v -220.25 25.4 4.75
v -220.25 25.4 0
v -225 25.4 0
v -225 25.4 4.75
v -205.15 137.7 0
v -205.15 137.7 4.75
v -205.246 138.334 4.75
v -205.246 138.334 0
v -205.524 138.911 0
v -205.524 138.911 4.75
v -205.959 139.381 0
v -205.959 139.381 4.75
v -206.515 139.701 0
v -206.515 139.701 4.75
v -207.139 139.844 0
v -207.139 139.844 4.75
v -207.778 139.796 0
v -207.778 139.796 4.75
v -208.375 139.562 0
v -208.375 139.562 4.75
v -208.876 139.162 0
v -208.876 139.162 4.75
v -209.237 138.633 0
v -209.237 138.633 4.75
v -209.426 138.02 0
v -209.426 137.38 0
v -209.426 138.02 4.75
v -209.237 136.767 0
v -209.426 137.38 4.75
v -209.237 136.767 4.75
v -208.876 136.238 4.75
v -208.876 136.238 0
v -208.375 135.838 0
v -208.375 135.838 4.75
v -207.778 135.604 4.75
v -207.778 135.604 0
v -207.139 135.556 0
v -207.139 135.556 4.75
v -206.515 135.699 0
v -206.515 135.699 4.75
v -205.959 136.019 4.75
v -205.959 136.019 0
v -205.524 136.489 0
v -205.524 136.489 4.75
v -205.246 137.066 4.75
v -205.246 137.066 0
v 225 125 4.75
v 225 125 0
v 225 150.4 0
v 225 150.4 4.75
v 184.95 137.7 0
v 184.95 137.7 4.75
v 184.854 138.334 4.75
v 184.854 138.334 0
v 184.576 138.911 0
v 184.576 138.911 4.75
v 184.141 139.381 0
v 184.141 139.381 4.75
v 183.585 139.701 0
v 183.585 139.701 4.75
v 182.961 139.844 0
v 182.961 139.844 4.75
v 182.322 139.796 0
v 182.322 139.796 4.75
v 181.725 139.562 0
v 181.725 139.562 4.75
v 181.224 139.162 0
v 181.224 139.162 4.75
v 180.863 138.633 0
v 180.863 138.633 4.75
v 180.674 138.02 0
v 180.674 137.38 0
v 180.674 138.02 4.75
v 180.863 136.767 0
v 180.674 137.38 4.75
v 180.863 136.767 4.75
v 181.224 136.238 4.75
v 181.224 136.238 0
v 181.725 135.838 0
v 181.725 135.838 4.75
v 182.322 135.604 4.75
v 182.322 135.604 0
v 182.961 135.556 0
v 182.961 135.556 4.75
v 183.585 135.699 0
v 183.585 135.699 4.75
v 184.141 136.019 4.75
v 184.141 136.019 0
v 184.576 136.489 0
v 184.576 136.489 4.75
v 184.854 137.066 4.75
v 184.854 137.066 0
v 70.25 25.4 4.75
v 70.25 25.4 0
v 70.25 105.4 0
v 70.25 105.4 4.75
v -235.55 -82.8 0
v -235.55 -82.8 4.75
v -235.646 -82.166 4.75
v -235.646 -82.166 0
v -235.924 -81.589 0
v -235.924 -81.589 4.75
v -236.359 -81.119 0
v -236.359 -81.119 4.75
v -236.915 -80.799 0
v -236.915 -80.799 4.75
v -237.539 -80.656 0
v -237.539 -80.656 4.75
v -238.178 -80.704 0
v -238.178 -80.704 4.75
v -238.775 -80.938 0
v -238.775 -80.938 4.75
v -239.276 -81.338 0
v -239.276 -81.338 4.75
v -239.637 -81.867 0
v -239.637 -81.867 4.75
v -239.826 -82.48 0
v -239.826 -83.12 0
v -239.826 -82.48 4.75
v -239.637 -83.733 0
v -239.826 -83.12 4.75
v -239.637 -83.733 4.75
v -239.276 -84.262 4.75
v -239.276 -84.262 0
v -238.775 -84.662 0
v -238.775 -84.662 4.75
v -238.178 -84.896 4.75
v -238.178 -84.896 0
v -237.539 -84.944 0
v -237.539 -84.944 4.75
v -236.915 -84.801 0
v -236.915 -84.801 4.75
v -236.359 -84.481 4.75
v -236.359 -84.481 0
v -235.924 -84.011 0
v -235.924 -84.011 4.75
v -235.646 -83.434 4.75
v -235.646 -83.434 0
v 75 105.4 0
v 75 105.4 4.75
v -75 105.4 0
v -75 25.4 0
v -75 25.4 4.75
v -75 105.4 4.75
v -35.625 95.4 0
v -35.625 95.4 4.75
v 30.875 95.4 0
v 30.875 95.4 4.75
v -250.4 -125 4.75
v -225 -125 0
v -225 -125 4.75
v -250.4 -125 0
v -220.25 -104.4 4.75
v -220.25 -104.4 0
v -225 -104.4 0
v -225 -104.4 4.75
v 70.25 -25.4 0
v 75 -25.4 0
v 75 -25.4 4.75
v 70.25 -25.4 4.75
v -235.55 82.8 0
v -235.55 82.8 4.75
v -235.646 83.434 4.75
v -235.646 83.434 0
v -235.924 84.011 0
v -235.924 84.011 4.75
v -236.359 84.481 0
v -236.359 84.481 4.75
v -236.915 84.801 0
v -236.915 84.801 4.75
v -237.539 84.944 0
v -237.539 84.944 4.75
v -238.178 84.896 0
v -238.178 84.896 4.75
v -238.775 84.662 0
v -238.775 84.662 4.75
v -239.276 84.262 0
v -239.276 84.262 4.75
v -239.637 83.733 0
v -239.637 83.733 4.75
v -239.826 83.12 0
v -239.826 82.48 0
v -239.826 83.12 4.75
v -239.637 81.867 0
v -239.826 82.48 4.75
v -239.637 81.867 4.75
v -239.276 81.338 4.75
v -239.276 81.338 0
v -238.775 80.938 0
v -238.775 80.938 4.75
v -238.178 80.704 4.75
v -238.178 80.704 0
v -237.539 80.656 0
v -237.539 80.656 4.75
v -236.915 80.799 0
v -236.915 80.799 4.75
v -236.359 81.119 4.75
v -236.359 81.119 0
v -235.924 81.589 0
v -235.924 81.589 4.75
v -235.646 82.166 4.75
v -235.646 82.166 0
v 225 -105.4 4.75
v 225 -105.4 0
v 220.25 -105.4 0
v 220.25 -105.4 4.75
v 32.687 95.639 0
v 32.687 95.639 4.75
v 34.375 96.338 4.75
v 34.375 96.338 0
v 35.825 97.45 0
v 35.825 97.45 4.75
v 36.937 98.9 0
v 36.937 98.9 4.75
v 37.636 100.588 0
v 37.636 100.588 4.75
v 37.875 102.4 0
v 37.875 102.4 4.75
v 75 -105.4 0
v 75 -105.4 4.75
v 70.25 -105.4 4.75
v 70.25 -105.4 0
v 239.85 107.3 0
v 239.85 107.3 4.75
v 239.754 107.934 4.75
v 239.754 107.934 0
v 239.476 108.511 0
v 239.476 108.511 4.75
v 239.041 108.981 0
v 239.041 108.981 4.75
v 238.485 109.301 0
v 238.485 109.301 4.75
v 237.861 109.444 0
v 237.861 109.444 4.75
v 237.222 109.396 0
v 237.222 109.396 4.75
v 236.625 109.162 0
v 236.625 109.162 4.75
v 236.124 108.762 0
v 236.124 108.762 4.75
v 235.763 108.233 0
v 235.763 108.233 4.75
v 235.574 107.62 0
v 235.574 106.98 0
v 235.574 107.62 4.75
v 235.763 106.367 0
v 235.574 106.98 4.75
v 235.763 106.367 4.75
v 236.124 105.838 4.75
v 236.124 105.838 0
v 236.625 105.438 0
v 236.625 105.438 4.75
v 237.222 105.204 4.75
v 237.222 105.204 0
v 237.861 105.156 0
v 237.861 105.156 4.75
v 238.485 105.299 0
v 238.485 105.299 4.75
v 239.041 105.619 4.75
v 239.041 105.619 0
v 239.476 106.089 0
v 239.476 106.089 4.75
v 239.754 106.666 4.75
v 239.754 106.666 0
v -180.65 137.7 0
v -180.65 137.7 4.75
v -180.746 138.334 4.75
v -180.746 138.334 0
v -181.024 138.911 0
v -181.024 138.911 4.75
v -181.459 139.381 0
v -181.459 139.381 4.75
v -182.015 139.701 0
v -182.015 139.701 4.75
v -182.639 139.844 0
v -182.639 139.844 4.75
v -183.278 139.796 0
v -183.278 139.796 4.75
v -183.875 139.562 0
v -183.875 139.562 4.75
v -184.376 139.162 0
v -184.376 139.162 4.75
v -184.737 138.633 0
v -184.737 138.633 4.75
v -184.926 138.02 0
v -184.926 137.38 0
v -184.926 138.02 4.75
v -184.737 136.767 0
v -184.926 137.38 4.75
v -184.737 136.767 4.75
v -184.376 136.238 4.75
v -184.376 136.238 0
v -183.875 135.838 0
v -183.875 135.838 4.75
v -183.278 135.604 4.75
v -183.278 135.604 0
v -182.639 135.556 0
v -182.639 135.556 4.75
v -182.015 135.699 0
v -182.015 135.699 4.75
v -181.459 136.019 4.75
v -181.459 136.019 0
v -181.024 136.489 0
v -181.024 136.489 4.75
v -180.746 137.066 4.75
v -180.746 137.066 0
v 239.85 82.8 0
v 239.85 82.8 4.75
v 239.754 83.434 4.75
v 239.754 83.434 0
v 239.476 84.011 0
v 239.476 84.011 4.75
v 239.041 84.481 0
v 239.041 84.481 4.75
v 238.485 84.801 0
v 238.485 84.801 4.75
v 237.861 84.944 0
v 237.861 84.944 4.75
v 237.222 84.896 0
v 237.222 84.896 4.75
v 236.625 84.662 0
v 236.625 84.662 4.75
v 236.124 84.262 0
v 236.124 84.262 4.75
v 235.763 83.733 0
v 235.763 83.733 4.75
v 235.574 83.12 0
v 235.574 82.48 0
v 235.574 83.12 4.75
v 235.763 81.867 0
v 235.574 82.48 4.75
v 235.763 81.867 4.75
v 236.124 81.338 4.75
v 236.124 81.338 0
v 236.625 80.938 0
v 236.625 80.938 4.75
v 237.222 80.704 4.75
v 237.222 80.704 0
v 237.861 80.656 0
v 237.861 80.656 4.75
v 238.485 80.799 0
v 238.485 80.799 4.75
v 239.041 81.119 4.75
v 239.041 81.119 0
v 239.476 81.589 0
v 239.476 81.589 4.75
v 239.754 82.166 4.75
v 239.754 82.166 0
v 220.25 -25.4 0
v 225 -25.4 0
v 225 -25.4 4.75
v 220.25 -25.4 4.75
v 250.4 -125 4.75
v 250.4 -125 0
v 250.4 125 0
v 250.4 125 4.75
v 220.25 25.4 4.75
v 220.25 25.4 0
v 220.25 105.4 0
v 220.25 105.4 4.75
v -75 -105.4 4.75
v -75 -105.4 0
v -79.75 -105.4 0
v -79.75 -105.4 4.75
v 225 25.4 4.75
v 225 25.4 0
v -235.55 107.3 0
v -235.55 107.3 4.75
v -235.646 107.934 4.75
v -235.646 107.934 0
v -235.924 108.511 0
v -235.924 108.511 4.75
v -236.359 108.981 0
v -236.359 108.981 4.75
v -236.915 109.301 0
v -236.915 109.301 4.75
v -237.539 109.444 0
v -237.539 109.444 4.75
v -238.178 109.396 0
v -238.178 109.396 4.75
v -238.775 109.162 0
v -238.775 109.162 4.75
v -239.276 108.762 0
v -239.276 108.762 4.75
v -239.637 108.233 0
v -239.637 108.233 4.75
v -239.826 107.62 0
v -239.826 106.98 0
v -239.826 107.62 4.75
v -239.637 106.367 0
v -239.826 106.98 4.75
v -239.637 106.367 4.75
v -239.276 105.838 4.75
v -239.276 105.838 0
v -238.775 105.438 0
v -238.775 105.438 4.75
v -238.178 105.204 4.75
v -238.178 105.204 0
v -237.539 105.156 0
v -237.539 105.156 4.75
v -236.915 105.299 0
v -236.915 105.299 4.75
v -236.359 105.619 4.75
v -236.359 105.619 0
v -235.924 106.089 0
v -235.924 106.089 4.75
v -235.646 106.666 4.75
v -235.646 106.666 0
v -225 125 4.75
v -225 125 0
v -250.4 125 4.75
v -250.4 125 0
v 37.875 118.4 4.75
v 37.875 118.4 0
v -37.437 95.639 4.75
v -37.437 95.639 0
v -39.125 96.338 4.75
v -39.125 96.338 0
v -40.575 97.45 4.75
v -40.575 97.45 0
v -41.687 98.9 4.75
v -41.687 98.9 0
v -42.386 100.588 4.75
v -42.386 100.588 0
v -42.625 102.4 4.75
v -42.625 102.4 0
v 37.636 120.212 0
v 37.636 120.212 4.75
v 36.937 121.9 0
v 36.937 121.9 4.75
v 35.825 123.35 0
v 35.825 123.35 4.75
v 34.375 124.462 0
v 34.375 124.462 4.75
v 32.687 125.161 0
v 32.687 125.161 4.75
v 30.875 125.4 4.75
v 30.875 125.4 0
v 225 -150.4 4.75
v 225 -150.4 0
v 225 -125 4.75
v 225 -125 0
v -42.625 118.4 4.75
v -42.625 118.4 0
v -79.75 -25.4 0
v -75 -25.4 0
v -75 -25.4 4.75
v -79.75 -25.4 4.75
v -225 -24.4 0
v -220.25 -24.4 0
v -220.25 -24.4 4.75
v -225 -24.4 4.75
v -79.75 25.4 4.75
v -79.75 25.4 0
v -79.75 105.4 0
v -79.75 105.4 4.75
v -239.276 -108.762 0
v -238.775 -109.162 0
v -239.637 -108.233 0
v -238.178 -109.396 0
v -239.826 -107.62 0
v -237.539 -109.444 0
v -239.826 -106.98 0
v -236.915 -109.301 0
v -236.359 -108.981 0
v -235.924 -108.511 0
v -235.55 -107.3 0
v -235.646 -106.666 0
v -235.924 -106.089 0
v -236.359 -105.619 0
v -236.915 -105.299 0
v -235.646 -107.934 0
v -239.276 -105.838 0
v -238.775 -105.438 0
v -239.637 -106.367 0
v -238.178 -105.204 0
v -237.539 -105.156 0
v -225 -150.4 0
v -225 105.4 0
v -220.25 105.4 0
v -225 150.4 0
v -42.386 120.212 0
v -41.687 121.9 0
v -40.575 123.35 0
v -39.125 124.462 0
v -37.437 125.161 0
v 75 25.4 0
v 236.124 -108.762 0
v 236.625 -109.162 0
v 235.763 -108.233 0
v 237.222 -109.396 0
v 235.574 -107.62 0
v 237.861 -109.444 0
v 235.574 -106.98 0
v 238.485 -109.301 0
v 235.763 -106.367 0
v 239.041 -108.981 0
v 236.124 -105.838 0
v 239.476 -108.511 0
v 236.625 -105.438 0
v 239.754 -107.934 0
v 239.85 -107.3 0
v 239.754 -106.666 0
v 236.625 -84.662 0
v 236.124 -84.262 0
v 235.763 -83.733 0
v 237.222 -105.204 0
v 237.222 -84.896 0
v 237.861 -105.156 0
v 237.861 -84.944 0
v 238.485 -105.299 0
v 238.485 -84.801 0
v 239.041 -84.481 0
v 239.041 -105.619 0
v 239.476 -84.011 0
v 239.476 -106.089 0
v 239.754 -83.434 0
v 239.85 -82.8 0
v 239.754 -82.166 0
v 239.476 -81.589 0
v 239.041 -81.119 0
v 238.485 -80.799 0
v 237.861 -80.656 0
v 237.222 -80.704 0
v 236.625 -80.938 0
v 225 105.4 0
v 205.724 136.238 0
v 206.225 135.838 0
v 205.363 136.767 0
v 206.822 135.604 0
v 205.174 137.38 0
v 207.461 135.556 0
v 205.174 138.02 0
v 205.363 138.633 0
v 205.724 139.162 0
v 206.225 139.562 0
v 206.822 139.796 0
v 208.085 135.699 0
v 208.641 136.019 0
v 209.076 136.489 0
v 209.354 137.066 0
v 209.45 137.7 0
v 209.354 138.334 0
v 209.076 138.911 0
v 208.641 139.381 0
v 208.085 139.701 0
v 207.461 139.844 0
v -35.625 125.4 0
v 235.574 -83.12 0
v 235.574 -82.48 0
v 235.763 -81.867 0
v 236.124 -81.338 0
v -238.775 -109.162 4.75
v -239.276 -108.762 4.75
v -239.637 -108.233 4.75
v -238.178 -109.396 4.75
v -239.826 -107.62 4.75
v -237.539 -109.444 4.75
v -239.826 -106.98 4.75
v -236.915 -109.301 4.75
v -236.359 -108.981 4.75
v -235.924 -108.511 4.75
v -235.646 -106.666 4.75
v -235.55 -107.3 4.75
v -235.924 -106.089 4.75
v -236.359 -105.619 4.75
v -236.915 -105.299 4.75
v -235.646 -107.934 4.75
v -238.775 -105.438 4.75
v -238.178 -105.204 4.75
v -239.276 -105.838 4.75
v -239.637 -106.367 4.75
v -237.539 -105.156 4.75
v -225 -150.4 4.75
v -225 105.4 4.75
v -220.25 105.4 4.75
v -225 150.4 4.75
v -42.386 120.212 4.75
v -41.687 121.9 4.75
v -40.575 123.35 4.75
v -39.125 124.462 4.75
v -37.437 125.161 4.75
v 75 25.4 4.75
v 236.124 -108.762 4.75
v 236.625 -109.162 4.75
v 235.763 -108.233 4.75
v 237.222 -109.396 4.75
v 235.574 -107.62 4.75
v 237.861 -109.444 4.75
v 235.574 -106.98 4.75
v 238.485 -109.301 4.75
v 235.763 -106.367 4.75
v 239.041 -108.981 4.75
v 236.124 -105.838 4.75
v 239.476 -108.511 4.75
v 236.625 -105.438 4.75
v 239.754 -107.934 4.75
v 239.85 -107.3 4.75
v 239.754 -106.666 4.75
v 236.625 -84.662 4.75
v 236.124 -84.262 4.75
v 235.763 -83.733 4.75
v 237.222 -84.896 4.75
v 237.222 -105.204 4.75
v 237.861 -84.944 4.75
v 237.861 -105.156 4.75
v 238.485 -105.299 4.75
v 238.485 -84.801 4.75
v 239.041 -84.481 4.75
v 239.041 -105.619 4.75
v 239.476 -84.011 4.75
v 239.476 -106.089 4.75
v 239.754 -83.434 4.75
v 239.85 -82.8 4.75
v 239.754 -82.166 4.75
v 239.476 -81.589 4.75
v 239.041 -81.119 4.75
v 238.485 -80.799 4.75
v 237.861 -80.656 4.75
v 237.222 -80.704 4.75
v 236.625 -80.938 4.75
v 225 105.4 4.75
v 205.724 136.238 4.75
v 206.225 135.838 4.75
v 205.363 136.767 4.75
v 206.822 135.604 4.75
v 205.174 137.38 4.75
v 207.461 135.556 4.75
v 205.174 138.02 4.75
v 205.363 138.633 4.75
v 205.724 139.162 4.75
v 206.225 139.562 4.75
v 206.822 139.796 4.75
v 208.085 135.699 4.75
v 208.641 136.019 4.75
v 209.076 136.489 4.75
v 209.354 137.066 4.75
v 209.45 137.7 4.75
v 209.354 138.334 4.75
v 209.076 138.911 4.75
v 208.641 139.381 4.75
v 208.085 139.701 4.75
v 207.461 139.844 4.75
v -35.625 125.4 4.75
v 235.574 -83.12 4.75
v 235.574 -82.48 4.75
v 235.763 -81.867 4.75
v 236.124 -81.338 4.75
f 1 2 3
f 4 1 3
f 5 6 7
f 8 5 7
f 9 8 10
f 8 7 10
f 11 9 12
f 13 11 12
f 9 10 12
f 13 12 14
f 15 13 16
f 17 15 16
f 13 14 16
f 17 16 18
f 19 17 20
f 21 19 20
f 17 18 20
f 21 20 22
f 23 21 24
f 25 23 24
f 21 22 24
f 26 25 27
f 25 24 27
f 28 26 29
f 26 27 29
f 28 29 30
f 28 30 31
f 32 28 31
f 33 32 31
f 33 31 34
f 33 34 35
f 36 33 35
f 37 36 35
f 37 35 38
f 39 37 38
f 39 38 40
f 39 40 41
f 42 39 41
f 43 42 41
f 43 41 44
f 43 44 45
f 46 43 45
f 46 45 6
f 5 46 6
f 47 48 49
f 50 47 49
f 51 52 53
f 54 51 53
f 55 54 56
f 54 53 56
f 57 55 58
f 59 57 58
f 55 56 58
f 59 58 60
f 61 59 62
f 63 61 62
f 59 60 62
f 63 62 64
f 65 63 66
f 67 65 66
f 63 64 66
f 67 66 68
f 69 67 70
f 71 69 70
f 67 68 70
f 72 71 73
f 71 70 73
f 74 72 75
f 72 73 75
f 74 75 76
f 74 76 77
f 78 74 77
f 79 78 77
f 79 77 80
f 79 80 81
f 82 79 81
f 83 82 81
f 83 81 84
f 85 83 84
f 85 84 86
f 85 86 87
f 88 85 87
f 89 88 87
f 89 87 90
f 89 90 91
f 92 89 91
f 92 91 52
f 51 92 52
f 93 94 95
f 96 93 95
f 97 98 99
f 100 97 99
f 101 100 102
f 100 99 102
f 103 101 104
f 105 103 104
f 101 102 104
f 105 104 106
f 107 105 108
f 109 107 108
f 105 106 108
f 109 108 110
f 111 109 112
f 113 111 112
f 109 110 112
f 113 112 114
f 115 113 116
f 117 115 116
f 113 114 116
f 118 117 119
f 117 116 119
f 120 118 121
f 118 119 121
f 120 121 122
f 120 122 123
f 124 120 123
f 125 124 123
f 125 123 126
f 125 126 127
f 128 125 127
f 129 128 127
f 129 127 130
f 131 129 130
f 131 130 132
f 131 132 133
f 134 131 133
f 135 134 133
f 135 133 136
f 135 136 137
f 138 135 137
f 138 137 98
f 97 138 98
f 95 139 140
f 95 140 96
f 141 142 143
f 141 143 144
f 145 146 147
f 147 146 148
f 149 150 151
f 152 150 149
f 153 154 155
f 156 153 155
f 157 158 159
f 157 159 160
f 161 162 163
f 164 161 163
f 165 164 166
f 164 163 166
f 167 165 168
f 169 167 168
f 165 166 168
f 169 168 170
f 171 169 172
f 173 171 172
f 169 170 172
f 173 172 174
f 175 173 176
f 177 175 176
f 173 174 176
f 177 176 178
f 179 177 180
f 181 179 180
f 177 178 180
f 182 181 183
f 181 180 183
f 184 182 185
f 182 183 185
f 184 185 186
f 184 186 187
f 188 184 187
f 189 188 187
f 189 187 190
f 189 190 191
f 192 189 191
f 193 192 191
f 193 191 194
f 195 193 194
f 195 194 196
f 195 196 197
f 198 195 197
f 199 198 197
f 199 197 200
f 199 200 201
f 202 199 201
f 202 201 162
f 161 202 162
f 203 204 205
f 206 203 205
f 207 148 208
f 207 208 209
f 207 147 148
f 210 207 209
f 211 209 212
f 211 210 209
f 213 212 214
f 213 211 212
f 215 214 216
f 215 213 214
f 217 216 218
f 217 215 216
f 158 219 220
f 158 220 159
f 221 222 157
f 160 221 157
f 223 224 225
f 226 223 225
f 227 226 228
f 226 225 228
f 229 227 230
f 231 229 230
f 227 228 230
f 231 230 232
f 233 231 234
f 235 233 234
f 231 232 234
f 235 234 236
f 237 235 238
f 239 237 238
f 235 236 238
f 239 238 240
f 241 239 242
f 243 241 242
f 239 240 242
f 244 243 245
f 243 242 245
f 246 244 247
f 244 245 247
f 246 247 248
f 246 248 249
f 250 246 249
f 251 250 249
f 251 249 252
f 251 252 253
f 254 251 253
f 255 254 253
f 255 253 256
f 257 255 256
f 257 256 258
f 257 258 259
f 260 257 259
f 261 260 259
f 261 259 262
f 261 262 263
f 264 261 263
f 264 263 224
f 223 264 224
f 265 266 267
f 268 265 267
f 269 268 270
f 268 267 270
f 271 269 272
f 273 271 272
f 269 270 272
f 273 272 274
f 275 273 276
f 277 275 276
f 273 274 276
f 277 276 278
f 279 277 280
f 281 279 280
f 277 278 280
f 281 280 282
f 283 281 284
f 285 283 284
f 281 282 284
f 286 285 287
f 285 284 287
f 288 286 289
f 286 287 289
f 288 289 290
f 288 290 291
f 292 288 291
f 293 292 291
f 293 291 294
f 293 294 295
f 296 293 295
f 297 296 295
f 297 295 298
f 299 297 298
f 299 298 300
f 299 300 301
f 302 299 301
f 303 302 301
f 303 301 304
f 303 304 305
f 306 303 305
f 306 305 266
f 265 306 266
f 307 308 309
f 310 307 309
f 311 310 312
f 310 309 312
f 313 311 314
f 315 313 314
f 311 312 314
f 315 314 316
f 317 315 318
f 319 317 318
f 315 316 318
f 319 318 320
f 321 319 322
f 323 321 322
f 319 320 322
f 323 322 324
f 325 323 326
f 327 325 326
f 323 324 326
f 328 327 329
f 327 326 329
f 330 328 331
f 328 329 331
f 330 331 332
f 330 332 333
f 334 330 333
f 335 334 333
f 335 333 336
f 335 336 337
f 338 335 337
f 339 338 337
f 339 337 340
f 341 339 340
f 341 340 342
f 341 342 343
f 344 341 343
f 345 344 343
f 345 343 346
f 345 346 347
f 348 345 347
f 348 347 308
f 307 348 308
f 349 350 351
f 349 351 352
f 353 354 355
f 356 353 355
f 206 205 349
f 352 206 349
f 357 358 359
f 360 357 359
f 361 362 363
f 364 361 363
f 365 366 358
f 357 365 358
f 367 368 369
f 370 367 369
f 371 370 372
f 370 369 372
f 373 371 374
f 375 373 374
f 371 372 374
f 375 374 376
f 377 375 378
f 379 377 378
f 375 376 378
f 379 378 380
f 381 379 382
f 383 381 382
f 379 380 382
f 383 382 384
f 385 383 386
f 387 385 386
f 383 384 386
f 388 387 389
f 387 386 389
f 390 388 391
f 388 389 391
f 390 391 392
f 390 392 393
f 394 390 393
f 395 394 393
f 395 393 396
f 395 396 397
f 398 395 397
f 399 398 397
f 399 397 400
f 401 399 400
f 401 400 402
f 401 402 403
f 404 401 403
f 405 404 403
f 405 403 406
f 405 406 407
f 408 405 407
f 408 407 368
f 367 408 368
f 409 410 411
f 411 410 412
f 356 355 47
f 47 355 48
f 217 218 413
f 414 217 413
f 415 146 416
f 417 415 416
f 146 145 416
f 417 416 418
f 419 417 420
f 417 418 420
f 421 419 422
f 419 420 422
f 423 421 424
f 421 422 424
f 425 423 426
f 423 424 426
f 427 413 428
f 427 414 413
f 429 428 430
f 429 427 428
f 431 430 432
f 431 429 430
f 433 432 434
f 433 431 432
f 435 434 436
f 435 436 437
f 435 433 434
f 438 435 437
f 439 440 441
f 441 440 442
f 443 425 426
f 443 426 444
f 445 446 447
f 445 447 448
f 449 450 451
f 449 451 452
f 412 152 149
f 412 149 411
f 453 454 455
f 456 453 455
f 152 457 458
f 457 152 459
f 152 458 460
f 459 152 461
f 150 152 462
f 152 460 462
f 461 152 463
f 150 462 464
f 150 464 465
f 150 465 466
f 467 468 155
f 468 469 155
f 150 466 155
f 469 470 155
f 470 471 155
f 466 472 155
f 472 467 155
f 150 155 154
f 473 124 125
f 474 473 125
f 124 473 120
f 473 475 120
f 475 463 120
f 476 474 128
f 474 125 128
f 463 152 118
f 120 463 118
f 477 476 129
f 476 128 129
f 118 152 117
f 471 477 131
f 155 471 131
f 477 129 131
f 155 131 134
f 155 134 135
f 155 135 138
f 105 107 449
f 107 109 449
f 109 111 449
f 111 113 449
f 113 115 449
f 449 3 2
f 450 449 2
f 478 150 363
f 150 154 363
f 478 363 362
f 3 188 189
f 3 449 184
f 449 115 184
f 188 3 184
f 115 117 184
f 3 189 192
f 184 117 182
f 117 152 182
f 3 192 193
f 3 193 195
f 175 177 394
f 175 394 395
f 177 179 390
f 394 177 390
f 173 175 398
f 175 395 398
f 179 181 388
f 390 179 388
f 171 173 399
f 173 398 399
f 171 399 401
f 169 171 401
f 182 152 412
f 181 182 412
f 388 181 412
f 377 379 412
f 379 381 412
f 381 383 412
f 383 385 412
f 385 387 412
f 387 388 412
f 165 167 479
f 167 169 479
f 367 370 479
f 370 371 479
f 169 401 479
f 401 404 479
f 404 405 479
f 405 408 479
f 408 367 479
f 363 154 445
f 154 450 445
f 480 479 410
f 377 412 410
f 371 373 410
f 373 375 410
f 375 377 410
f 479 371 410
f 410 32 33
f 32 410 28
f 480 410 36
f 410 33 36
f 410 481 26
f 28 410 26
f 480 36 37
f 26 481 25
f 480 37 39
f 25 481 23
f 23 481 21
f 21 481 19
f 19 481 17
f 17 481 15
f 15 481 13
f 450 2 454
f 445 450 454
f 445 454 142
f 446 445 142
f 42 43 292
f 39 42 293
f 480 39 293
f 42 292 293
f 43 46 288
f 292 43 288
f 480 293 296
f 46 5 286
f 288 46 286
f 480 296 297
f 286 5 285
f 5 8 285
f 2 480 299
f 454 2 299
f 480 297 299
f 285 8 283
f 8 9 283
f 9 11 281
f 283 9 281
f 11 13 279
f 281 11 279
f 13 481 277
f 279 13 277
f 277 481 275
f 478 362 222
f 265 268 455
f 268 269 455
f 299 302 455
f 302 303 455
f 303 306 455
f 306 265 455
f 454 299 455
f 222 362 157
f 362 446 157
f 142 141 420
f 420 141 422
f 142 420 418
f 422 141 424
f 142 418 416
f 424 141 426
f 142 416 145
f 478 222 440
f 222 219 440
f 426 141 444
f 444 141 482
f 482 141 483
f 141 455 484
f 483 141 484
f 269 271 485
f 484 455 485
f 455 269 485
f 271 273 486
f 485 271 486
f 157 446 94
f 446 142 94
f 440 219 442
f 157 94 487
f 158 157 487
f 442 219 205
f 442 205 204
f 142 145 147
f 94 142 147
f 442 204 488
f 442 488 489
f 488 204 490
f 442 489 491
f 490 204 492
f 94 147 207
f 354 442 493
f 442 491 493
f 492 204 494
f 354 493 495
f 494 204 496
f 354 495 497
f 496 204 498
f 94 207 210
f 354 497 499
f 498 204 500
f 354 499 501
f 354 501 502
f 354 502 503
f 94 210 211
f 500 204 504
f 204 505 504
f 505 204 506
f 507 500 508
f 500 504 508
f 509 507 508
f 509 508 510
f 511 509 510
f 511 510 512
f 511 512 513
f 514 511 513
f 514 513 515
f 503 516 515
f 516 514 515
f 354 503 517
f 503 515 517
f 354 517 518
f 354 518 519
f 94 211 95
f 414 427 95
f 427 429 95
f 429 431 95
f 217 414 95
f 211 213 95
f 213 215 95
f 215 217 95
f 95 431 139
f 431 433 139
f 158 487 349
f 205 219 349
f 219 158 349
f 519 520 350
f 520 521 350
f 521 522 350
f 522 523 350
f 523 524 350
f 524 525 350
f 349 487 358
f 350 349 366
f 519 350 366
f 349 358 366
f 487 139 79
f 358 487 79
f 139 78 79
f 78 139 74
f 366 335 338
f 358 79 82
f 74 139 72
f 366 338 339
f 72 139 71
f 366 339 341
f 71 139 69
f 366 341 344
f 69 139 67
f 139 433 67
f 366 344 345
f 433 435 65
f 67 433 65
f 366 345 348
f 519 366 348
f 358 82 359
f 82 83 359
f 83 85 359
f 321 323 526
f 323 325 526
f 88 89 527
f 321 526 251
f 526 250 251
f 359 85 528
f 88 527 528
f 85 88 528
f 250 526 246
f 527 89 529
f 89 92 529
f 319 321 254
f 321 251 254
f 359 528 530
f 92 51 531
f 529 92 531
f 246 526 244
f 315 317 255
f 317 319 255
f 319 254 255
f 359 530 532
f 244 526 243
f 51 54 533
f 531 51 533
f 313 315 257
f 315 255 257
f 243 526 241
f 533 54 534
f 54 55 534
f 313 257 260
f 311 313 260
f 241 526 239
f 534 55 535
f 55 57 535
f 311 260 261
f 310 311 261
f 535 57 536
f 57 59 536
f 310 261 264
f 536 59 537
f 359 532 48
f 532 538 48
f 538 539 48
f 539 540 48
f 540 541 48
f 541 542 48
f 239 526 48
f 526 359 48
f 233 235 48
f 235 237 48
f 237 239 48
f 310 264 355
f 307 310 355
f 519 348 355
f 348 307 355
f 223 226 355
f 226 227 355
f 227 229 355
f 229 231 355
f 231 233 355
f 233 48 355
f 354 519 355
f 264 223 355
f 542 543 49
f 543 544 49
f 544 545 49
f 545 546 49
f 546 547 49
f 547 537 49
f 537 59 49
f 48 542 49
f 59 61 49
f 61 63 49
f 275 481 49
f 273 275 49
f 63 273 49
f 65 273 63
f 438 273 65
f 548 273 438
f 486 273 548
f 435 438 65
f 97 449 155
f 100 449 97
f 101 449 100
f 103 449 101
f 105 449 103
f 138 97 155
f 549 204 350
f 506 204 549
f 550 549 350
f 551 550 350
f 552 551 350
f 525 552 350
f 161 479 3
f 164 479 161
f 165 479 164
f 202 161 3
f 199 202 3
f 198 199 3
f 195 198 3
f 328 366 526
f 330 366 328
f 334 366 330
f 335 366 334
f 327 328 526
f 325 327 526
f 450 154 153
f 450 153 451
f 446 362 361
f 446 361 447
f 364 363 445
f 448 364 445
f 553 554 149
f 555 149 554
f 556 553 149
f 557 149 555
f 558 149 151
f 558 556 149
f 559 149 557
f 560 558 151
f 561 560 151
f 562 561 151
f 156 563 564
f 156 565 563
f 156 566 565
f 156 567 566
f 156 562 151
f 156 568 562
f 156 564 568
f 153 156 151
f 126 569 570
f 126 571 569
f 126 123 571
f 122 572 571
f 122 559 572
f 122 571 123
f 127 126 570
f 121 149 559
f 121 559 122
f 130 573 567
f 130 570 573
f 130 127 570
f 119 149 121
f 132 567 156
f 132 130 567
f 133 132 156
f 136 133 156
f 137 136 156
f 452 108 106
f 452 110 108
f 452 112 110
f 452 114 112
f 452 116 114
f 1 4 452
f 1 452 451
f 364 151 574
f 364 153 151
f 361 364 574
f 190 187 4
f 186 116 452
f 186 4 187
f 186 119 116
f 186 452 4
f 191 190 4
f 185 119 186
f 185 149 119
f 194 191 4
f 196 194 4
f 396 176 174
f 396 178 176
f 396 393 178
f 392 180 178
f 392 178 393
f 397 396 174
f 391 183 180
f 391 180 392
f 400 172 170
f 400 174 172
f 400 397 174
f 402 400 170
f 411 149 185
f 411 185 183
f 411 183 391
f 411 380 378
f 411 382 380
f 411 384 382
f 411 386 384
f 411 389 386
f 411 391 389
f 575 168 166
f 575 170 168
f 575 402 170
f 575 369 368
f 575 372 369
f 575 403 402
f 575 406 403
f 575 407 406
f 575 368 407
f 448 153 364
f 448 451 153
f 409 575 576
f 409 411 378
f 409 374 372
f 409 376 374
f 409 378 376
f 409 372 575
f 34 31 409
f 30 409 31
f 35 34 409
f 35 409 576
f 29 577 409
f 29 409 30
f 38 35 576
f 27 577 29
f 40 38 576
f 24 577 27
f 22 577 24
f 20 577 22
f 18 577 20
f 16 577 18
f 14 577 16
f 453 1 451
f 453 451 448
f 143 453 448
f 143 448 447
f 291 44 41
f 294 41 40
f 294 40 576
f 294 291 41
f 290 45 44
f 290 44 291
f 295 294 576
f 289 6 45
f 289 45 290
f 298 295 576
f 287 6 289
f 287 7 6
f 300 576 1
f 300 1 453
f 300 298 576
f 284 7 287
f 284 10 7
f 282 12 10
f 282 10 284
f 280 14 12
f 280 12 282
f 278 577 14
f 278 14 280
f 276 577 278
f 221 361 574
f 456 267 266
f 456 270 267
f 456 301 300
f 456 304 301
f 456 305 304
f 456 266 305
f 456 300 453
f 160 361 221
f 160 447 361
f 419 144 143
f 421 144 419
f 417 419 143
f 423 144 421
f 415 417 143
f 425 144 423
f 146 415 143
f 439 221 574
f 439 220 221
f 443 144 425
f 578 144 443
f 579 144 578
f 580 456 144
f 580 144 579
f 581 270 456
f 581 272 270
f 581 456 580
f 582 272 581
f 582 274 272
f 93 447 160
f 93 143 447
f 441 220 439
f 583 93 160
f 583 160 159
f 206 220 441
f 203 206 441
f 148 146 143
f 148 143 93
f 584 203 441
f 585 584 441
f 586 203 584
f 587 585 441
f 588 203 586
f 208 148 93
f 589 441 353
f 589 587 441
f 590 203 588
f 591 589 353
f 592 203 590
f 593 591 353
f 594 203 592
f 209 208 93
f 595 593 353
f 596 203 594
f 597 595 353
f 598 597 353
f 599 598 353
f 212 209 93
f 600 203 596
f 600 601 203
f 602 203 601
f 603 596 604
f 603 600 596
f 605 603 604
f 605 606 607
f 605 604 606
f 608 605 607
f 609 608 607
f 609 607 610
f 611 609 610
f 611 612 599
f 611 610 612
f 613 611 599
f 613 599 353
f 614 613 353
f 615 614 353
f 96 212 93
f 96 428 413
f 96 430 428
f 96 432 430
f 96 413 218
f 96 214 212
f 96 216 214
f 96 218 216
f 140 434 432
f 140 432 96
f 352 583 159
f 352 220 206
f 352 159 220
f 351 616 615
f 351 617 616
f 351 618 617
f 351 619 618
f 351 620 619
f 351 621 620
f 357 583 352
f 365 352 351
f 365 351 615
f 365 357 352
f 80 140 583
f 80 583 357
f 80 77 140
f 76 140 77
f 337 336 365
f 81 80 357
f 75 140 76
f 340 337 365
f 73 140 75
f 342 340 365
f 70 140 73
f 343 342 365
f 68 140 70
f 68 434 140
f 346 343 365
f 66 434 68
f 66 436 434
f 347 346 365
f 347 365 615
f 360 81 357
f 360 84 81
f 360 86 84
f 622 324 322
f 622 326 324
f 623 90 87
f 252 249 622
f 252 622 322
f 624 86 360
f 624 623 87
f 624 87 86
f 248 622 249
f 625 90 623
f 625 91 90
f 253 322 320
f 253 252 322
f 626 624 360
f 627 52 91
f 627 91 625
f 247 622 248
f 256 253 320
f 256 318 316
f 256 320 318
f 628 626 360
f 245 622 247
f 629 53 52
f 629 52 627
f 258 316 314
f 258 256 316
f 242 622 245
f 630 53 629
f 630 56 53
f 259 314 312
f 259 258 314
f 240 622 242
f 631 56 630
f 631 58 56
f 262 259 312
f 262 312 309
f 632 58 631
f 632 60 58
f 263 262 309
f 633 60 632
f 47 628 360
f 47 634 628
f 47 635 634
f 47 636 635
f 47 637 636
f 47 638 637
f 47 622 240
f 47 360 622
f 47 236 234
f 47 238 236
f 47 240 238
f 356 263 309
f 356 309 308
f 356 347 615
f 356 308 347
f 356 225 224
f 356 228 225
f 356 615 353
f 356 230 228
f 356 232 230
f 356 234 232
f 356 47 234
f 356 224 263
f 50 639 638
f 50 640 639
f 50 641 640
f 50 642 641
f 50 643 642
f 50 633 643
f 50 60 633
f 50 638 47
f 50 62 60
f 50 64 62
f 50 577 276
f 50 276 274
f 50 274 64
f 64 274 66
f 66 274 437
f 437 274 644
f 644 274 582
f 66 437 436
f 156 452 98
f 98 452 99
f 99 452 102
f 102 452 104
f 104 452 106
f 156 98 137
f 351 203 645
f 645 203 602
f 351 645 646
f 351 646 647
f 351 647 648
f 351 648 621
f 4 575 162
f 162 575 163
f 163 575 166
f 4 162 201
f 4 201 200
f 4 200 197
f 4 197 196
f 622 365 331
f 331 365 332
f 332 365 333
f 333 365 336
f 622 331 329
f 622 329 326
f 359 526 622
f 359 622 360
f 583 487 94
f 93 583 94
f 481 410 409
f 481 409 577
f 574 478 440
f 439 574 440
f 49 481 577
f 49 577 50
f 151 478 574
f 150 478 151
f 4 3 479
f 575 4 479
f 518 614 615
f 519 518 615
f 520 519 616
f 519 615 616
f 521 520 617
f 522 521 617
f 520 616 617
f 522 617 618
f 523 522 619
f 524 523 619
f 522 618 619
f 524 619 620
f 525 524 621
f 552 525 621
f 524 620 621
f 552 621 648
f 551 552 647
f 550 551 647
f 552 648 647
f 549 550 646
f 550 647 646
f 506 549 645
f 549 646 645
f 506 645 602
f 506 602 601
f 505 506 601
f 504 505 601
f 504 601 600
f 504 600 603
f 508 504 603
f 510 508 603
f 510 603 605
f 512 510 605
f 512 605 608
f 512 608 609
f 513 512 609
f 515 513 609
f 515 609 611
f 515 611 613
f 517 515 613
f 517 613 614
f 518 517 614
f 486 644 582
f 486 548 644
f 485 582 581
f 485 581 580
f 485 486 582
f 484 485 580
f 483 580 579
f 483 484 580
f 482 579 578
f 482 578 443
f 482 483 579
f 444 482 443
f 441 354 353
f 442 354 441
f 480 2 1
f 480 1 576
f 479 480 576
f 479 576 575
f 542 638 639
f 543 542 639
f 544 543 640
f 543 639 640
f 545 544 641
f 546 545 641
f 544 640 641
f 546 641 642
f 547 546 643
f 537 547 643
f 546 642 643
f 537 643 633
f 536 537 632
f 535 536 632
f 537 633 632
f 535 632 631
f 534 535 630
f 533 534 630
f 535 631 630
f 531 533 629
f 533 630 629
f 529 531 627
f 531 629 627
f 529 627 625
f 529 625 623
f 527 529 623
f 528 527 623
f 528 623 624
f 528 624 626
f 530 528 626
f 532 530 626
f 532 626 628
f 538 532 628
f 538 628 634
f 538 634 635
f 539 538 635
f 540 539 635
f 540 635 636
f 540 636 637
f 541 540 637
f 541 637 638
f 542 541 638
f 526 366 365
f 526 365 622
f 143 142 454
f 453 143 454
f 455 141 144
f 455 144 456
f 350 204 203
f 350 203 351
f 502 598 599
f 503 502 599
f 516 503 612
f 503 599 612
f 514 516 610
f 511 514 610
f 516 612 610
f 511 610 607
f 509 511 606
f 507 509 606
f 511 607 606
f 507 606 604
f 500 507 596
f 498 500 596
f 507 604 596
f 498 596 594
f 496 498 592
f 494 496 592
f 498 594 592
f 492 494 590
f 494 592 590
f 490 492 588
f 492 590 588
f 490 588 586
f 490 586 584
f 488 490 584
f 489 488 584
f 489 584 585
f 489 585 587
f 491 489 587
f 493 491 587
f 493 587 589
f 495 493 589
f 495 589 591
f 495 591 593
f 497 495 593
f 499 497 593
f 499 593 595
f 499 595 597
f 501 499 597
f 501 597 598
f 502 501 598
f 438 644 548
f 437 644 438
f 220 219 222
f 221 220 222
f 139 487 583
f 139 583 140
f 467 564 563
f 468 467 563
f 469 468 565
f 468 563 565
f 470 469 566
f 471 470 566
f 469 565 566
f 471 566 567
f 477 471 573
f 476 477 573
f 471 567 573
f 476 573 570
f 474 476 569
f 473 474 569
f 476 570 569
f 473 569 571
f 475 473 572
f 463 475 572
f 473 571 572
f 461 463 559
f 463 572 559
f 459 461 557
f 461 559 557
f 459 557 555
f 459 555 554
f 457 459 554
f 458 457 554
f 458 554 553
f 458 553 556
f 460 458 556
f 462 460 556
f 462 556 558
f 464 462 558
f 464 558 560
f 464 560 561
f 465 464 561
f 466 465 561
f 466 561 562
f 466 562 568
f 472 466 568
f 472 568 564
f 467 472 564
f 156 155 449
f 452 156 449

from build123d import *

# Parameters (mm, degrees)
SKETCH_1_W          = 500.8
SKETCH_1_H          = 300.8
EXTRUDE_1_DEPTH     = 4.75
SKETCH_2_W          = 25.4
SKETCH_2_H          = 25.4
SKETCH_2_W_2        = 4.75
SKETCH_2_H_2        = 80
CUT_EXTRUDE_1_DEPTH = 10
SKETCH_3_R          = 2.150000004
SKETCH_3_R_2        = 2.15
CUT_EXTRUDE_2_DEPTH = 5
SKETCH_4_W          = 80.5
SKETCH_4_H          = 30
CUT_EXTRUDE_3_DEPTH = 4.75
FILLET_1_R          = 7


with BuildPart() as part:
    # 草圖1 → 填料-伸長1 (new body)
    with BuildSketch(Plane.XY):
        Rectangle(SKETCH_1_W, SKETCH_1_H)
    extrude(amount=EXTRUDE_1_DEPTH)

    # 草圖2 → 除料-伸長1 (cut)
    with BuildSketch(Plane(origin=(0, 0, 0), x_dir=(-1, 0, 0), z_dir=(0, 0, -1))):
        with Locations((-237.7, 137.7)):
            Rectangle(SKETCH_2_W, SKETCH_2_H)
        with Locations((-237.7, -137.7)):
            Rectangle(SKETCH_2_W, SKETCH_2_H)
        with Locations((237.7, 137.7)):
            Rectangle(SKETCH_2_W, SKETCH_2_H)
        with Locations((237.7, -137.7)):
            Rectangle(SKETCH_2_W, SKETCH_2_H)
        with Locations((-222.625, 65.4)):
            Rectangle(SKETCH_2_W_2, SKETCH_2_H_2)
        with Locations((-222.625, -65.4)):
            Rectangle(SKETCH_2_W_2, SKETCH_2_H_2)
        with Locations((222.625, 65.4)):
            Rectangle(SKETCH_2_W_2, SKETCH_2_H_2)
        with Locations((222.625, -64.4)):
            Rectangle(SKETCH_2_W_2, SKETCH_2_H_2)
        with Locations((-72.625, 65.4)):
            Rectangle(SKETCH_2_W_2, SKETCH_2_H_2)
        with Locations((77.375, 65.4)):
            Rectangle(SKETCH_2_W_2, SKETCH_2_H_2)
        with Locations((77.375, -65.4)):
            Rectangle(SKETCH_2_W_2, SKETCH_2_H_2)
        with Locations((-72.625, -65.4)):
            Rectangle(SKETCH_2_W_2, SKETCH_2_H_2)
    extrude(amount=-CUT_EXTRUDE_1_DEPTH, mode=Mode.SUBTRACT)

    # 草圖3 → 除料-伸長2 (cut)
    with BuildSketch(Plane.XY.offset(4.75)):
        with Locations((-237.7, 107.300000013)):
            Circle(SKETCH_3_R)
        with Locations((-237.7, 82.800000013)):
            Circle(SKETCH_3_R)
        with Locations((-207.3, 137.700000006)):
            Circle(SKETCH_3_R_2)
        with Locations((-182.8, 137.700000006)):
            Circle(SKETCH_3_R_2)
        with Locations((-237.7, -82.800000001)):
            Circle(SKETCH_3_R_2)
        with Locations((-237.7, -107.300000001)):
            Circle(SKETCH_3_R_2)
        with Locations((237.7, -107.300000007)):
            Circle(SKETCH_3_R)
        with Locations((237.7, -82.800000007)):
            Circle(SKETCH_3_R)
        with Locations((237.7, 107.300000006)):
            Circle(SKETCH_3_R_2)
        with Locations((237.7, 82.800000006)):
            Circle(SKETCH_3_R_2)
        with Locations((182.8, 137.700000006)):
            Circle(SKETCH_3_R_2)
        with Locations((207.3, 137.700000006)):
            Circle(SKETCH_3_R_2)
    extrude(amount=-CUT_EXTRUDE_2_DEPTH, mode=Mode.SUBTRACT)

    # 草圖4 → 除料-伸長3 (cut)
    with BuildSketch(Plane.XY.offset(4.75)):
        with Locations((-2.375, 110.4)):
            Rectangle(SKETCH_4_W, SKETCH_4_H)
    extrude(amount=-CUT_EXTRUDE_3_DEPTH, mode=Mode.SUBTRACT)

    # 圓角1
    fillet_1_edges = [part.edges().sort_by_distance(p)[0] for p in [
        (37.875, 125.4, 2.375),
        (37.875, 95.4, 2.375),
        (-42.625, 95.4, 2.375),
        (-42.625, 125.4, 2.375),
    ]]
    fillet(fillet_1_edges, radius=FILLET_1_R)


solid = part.part
